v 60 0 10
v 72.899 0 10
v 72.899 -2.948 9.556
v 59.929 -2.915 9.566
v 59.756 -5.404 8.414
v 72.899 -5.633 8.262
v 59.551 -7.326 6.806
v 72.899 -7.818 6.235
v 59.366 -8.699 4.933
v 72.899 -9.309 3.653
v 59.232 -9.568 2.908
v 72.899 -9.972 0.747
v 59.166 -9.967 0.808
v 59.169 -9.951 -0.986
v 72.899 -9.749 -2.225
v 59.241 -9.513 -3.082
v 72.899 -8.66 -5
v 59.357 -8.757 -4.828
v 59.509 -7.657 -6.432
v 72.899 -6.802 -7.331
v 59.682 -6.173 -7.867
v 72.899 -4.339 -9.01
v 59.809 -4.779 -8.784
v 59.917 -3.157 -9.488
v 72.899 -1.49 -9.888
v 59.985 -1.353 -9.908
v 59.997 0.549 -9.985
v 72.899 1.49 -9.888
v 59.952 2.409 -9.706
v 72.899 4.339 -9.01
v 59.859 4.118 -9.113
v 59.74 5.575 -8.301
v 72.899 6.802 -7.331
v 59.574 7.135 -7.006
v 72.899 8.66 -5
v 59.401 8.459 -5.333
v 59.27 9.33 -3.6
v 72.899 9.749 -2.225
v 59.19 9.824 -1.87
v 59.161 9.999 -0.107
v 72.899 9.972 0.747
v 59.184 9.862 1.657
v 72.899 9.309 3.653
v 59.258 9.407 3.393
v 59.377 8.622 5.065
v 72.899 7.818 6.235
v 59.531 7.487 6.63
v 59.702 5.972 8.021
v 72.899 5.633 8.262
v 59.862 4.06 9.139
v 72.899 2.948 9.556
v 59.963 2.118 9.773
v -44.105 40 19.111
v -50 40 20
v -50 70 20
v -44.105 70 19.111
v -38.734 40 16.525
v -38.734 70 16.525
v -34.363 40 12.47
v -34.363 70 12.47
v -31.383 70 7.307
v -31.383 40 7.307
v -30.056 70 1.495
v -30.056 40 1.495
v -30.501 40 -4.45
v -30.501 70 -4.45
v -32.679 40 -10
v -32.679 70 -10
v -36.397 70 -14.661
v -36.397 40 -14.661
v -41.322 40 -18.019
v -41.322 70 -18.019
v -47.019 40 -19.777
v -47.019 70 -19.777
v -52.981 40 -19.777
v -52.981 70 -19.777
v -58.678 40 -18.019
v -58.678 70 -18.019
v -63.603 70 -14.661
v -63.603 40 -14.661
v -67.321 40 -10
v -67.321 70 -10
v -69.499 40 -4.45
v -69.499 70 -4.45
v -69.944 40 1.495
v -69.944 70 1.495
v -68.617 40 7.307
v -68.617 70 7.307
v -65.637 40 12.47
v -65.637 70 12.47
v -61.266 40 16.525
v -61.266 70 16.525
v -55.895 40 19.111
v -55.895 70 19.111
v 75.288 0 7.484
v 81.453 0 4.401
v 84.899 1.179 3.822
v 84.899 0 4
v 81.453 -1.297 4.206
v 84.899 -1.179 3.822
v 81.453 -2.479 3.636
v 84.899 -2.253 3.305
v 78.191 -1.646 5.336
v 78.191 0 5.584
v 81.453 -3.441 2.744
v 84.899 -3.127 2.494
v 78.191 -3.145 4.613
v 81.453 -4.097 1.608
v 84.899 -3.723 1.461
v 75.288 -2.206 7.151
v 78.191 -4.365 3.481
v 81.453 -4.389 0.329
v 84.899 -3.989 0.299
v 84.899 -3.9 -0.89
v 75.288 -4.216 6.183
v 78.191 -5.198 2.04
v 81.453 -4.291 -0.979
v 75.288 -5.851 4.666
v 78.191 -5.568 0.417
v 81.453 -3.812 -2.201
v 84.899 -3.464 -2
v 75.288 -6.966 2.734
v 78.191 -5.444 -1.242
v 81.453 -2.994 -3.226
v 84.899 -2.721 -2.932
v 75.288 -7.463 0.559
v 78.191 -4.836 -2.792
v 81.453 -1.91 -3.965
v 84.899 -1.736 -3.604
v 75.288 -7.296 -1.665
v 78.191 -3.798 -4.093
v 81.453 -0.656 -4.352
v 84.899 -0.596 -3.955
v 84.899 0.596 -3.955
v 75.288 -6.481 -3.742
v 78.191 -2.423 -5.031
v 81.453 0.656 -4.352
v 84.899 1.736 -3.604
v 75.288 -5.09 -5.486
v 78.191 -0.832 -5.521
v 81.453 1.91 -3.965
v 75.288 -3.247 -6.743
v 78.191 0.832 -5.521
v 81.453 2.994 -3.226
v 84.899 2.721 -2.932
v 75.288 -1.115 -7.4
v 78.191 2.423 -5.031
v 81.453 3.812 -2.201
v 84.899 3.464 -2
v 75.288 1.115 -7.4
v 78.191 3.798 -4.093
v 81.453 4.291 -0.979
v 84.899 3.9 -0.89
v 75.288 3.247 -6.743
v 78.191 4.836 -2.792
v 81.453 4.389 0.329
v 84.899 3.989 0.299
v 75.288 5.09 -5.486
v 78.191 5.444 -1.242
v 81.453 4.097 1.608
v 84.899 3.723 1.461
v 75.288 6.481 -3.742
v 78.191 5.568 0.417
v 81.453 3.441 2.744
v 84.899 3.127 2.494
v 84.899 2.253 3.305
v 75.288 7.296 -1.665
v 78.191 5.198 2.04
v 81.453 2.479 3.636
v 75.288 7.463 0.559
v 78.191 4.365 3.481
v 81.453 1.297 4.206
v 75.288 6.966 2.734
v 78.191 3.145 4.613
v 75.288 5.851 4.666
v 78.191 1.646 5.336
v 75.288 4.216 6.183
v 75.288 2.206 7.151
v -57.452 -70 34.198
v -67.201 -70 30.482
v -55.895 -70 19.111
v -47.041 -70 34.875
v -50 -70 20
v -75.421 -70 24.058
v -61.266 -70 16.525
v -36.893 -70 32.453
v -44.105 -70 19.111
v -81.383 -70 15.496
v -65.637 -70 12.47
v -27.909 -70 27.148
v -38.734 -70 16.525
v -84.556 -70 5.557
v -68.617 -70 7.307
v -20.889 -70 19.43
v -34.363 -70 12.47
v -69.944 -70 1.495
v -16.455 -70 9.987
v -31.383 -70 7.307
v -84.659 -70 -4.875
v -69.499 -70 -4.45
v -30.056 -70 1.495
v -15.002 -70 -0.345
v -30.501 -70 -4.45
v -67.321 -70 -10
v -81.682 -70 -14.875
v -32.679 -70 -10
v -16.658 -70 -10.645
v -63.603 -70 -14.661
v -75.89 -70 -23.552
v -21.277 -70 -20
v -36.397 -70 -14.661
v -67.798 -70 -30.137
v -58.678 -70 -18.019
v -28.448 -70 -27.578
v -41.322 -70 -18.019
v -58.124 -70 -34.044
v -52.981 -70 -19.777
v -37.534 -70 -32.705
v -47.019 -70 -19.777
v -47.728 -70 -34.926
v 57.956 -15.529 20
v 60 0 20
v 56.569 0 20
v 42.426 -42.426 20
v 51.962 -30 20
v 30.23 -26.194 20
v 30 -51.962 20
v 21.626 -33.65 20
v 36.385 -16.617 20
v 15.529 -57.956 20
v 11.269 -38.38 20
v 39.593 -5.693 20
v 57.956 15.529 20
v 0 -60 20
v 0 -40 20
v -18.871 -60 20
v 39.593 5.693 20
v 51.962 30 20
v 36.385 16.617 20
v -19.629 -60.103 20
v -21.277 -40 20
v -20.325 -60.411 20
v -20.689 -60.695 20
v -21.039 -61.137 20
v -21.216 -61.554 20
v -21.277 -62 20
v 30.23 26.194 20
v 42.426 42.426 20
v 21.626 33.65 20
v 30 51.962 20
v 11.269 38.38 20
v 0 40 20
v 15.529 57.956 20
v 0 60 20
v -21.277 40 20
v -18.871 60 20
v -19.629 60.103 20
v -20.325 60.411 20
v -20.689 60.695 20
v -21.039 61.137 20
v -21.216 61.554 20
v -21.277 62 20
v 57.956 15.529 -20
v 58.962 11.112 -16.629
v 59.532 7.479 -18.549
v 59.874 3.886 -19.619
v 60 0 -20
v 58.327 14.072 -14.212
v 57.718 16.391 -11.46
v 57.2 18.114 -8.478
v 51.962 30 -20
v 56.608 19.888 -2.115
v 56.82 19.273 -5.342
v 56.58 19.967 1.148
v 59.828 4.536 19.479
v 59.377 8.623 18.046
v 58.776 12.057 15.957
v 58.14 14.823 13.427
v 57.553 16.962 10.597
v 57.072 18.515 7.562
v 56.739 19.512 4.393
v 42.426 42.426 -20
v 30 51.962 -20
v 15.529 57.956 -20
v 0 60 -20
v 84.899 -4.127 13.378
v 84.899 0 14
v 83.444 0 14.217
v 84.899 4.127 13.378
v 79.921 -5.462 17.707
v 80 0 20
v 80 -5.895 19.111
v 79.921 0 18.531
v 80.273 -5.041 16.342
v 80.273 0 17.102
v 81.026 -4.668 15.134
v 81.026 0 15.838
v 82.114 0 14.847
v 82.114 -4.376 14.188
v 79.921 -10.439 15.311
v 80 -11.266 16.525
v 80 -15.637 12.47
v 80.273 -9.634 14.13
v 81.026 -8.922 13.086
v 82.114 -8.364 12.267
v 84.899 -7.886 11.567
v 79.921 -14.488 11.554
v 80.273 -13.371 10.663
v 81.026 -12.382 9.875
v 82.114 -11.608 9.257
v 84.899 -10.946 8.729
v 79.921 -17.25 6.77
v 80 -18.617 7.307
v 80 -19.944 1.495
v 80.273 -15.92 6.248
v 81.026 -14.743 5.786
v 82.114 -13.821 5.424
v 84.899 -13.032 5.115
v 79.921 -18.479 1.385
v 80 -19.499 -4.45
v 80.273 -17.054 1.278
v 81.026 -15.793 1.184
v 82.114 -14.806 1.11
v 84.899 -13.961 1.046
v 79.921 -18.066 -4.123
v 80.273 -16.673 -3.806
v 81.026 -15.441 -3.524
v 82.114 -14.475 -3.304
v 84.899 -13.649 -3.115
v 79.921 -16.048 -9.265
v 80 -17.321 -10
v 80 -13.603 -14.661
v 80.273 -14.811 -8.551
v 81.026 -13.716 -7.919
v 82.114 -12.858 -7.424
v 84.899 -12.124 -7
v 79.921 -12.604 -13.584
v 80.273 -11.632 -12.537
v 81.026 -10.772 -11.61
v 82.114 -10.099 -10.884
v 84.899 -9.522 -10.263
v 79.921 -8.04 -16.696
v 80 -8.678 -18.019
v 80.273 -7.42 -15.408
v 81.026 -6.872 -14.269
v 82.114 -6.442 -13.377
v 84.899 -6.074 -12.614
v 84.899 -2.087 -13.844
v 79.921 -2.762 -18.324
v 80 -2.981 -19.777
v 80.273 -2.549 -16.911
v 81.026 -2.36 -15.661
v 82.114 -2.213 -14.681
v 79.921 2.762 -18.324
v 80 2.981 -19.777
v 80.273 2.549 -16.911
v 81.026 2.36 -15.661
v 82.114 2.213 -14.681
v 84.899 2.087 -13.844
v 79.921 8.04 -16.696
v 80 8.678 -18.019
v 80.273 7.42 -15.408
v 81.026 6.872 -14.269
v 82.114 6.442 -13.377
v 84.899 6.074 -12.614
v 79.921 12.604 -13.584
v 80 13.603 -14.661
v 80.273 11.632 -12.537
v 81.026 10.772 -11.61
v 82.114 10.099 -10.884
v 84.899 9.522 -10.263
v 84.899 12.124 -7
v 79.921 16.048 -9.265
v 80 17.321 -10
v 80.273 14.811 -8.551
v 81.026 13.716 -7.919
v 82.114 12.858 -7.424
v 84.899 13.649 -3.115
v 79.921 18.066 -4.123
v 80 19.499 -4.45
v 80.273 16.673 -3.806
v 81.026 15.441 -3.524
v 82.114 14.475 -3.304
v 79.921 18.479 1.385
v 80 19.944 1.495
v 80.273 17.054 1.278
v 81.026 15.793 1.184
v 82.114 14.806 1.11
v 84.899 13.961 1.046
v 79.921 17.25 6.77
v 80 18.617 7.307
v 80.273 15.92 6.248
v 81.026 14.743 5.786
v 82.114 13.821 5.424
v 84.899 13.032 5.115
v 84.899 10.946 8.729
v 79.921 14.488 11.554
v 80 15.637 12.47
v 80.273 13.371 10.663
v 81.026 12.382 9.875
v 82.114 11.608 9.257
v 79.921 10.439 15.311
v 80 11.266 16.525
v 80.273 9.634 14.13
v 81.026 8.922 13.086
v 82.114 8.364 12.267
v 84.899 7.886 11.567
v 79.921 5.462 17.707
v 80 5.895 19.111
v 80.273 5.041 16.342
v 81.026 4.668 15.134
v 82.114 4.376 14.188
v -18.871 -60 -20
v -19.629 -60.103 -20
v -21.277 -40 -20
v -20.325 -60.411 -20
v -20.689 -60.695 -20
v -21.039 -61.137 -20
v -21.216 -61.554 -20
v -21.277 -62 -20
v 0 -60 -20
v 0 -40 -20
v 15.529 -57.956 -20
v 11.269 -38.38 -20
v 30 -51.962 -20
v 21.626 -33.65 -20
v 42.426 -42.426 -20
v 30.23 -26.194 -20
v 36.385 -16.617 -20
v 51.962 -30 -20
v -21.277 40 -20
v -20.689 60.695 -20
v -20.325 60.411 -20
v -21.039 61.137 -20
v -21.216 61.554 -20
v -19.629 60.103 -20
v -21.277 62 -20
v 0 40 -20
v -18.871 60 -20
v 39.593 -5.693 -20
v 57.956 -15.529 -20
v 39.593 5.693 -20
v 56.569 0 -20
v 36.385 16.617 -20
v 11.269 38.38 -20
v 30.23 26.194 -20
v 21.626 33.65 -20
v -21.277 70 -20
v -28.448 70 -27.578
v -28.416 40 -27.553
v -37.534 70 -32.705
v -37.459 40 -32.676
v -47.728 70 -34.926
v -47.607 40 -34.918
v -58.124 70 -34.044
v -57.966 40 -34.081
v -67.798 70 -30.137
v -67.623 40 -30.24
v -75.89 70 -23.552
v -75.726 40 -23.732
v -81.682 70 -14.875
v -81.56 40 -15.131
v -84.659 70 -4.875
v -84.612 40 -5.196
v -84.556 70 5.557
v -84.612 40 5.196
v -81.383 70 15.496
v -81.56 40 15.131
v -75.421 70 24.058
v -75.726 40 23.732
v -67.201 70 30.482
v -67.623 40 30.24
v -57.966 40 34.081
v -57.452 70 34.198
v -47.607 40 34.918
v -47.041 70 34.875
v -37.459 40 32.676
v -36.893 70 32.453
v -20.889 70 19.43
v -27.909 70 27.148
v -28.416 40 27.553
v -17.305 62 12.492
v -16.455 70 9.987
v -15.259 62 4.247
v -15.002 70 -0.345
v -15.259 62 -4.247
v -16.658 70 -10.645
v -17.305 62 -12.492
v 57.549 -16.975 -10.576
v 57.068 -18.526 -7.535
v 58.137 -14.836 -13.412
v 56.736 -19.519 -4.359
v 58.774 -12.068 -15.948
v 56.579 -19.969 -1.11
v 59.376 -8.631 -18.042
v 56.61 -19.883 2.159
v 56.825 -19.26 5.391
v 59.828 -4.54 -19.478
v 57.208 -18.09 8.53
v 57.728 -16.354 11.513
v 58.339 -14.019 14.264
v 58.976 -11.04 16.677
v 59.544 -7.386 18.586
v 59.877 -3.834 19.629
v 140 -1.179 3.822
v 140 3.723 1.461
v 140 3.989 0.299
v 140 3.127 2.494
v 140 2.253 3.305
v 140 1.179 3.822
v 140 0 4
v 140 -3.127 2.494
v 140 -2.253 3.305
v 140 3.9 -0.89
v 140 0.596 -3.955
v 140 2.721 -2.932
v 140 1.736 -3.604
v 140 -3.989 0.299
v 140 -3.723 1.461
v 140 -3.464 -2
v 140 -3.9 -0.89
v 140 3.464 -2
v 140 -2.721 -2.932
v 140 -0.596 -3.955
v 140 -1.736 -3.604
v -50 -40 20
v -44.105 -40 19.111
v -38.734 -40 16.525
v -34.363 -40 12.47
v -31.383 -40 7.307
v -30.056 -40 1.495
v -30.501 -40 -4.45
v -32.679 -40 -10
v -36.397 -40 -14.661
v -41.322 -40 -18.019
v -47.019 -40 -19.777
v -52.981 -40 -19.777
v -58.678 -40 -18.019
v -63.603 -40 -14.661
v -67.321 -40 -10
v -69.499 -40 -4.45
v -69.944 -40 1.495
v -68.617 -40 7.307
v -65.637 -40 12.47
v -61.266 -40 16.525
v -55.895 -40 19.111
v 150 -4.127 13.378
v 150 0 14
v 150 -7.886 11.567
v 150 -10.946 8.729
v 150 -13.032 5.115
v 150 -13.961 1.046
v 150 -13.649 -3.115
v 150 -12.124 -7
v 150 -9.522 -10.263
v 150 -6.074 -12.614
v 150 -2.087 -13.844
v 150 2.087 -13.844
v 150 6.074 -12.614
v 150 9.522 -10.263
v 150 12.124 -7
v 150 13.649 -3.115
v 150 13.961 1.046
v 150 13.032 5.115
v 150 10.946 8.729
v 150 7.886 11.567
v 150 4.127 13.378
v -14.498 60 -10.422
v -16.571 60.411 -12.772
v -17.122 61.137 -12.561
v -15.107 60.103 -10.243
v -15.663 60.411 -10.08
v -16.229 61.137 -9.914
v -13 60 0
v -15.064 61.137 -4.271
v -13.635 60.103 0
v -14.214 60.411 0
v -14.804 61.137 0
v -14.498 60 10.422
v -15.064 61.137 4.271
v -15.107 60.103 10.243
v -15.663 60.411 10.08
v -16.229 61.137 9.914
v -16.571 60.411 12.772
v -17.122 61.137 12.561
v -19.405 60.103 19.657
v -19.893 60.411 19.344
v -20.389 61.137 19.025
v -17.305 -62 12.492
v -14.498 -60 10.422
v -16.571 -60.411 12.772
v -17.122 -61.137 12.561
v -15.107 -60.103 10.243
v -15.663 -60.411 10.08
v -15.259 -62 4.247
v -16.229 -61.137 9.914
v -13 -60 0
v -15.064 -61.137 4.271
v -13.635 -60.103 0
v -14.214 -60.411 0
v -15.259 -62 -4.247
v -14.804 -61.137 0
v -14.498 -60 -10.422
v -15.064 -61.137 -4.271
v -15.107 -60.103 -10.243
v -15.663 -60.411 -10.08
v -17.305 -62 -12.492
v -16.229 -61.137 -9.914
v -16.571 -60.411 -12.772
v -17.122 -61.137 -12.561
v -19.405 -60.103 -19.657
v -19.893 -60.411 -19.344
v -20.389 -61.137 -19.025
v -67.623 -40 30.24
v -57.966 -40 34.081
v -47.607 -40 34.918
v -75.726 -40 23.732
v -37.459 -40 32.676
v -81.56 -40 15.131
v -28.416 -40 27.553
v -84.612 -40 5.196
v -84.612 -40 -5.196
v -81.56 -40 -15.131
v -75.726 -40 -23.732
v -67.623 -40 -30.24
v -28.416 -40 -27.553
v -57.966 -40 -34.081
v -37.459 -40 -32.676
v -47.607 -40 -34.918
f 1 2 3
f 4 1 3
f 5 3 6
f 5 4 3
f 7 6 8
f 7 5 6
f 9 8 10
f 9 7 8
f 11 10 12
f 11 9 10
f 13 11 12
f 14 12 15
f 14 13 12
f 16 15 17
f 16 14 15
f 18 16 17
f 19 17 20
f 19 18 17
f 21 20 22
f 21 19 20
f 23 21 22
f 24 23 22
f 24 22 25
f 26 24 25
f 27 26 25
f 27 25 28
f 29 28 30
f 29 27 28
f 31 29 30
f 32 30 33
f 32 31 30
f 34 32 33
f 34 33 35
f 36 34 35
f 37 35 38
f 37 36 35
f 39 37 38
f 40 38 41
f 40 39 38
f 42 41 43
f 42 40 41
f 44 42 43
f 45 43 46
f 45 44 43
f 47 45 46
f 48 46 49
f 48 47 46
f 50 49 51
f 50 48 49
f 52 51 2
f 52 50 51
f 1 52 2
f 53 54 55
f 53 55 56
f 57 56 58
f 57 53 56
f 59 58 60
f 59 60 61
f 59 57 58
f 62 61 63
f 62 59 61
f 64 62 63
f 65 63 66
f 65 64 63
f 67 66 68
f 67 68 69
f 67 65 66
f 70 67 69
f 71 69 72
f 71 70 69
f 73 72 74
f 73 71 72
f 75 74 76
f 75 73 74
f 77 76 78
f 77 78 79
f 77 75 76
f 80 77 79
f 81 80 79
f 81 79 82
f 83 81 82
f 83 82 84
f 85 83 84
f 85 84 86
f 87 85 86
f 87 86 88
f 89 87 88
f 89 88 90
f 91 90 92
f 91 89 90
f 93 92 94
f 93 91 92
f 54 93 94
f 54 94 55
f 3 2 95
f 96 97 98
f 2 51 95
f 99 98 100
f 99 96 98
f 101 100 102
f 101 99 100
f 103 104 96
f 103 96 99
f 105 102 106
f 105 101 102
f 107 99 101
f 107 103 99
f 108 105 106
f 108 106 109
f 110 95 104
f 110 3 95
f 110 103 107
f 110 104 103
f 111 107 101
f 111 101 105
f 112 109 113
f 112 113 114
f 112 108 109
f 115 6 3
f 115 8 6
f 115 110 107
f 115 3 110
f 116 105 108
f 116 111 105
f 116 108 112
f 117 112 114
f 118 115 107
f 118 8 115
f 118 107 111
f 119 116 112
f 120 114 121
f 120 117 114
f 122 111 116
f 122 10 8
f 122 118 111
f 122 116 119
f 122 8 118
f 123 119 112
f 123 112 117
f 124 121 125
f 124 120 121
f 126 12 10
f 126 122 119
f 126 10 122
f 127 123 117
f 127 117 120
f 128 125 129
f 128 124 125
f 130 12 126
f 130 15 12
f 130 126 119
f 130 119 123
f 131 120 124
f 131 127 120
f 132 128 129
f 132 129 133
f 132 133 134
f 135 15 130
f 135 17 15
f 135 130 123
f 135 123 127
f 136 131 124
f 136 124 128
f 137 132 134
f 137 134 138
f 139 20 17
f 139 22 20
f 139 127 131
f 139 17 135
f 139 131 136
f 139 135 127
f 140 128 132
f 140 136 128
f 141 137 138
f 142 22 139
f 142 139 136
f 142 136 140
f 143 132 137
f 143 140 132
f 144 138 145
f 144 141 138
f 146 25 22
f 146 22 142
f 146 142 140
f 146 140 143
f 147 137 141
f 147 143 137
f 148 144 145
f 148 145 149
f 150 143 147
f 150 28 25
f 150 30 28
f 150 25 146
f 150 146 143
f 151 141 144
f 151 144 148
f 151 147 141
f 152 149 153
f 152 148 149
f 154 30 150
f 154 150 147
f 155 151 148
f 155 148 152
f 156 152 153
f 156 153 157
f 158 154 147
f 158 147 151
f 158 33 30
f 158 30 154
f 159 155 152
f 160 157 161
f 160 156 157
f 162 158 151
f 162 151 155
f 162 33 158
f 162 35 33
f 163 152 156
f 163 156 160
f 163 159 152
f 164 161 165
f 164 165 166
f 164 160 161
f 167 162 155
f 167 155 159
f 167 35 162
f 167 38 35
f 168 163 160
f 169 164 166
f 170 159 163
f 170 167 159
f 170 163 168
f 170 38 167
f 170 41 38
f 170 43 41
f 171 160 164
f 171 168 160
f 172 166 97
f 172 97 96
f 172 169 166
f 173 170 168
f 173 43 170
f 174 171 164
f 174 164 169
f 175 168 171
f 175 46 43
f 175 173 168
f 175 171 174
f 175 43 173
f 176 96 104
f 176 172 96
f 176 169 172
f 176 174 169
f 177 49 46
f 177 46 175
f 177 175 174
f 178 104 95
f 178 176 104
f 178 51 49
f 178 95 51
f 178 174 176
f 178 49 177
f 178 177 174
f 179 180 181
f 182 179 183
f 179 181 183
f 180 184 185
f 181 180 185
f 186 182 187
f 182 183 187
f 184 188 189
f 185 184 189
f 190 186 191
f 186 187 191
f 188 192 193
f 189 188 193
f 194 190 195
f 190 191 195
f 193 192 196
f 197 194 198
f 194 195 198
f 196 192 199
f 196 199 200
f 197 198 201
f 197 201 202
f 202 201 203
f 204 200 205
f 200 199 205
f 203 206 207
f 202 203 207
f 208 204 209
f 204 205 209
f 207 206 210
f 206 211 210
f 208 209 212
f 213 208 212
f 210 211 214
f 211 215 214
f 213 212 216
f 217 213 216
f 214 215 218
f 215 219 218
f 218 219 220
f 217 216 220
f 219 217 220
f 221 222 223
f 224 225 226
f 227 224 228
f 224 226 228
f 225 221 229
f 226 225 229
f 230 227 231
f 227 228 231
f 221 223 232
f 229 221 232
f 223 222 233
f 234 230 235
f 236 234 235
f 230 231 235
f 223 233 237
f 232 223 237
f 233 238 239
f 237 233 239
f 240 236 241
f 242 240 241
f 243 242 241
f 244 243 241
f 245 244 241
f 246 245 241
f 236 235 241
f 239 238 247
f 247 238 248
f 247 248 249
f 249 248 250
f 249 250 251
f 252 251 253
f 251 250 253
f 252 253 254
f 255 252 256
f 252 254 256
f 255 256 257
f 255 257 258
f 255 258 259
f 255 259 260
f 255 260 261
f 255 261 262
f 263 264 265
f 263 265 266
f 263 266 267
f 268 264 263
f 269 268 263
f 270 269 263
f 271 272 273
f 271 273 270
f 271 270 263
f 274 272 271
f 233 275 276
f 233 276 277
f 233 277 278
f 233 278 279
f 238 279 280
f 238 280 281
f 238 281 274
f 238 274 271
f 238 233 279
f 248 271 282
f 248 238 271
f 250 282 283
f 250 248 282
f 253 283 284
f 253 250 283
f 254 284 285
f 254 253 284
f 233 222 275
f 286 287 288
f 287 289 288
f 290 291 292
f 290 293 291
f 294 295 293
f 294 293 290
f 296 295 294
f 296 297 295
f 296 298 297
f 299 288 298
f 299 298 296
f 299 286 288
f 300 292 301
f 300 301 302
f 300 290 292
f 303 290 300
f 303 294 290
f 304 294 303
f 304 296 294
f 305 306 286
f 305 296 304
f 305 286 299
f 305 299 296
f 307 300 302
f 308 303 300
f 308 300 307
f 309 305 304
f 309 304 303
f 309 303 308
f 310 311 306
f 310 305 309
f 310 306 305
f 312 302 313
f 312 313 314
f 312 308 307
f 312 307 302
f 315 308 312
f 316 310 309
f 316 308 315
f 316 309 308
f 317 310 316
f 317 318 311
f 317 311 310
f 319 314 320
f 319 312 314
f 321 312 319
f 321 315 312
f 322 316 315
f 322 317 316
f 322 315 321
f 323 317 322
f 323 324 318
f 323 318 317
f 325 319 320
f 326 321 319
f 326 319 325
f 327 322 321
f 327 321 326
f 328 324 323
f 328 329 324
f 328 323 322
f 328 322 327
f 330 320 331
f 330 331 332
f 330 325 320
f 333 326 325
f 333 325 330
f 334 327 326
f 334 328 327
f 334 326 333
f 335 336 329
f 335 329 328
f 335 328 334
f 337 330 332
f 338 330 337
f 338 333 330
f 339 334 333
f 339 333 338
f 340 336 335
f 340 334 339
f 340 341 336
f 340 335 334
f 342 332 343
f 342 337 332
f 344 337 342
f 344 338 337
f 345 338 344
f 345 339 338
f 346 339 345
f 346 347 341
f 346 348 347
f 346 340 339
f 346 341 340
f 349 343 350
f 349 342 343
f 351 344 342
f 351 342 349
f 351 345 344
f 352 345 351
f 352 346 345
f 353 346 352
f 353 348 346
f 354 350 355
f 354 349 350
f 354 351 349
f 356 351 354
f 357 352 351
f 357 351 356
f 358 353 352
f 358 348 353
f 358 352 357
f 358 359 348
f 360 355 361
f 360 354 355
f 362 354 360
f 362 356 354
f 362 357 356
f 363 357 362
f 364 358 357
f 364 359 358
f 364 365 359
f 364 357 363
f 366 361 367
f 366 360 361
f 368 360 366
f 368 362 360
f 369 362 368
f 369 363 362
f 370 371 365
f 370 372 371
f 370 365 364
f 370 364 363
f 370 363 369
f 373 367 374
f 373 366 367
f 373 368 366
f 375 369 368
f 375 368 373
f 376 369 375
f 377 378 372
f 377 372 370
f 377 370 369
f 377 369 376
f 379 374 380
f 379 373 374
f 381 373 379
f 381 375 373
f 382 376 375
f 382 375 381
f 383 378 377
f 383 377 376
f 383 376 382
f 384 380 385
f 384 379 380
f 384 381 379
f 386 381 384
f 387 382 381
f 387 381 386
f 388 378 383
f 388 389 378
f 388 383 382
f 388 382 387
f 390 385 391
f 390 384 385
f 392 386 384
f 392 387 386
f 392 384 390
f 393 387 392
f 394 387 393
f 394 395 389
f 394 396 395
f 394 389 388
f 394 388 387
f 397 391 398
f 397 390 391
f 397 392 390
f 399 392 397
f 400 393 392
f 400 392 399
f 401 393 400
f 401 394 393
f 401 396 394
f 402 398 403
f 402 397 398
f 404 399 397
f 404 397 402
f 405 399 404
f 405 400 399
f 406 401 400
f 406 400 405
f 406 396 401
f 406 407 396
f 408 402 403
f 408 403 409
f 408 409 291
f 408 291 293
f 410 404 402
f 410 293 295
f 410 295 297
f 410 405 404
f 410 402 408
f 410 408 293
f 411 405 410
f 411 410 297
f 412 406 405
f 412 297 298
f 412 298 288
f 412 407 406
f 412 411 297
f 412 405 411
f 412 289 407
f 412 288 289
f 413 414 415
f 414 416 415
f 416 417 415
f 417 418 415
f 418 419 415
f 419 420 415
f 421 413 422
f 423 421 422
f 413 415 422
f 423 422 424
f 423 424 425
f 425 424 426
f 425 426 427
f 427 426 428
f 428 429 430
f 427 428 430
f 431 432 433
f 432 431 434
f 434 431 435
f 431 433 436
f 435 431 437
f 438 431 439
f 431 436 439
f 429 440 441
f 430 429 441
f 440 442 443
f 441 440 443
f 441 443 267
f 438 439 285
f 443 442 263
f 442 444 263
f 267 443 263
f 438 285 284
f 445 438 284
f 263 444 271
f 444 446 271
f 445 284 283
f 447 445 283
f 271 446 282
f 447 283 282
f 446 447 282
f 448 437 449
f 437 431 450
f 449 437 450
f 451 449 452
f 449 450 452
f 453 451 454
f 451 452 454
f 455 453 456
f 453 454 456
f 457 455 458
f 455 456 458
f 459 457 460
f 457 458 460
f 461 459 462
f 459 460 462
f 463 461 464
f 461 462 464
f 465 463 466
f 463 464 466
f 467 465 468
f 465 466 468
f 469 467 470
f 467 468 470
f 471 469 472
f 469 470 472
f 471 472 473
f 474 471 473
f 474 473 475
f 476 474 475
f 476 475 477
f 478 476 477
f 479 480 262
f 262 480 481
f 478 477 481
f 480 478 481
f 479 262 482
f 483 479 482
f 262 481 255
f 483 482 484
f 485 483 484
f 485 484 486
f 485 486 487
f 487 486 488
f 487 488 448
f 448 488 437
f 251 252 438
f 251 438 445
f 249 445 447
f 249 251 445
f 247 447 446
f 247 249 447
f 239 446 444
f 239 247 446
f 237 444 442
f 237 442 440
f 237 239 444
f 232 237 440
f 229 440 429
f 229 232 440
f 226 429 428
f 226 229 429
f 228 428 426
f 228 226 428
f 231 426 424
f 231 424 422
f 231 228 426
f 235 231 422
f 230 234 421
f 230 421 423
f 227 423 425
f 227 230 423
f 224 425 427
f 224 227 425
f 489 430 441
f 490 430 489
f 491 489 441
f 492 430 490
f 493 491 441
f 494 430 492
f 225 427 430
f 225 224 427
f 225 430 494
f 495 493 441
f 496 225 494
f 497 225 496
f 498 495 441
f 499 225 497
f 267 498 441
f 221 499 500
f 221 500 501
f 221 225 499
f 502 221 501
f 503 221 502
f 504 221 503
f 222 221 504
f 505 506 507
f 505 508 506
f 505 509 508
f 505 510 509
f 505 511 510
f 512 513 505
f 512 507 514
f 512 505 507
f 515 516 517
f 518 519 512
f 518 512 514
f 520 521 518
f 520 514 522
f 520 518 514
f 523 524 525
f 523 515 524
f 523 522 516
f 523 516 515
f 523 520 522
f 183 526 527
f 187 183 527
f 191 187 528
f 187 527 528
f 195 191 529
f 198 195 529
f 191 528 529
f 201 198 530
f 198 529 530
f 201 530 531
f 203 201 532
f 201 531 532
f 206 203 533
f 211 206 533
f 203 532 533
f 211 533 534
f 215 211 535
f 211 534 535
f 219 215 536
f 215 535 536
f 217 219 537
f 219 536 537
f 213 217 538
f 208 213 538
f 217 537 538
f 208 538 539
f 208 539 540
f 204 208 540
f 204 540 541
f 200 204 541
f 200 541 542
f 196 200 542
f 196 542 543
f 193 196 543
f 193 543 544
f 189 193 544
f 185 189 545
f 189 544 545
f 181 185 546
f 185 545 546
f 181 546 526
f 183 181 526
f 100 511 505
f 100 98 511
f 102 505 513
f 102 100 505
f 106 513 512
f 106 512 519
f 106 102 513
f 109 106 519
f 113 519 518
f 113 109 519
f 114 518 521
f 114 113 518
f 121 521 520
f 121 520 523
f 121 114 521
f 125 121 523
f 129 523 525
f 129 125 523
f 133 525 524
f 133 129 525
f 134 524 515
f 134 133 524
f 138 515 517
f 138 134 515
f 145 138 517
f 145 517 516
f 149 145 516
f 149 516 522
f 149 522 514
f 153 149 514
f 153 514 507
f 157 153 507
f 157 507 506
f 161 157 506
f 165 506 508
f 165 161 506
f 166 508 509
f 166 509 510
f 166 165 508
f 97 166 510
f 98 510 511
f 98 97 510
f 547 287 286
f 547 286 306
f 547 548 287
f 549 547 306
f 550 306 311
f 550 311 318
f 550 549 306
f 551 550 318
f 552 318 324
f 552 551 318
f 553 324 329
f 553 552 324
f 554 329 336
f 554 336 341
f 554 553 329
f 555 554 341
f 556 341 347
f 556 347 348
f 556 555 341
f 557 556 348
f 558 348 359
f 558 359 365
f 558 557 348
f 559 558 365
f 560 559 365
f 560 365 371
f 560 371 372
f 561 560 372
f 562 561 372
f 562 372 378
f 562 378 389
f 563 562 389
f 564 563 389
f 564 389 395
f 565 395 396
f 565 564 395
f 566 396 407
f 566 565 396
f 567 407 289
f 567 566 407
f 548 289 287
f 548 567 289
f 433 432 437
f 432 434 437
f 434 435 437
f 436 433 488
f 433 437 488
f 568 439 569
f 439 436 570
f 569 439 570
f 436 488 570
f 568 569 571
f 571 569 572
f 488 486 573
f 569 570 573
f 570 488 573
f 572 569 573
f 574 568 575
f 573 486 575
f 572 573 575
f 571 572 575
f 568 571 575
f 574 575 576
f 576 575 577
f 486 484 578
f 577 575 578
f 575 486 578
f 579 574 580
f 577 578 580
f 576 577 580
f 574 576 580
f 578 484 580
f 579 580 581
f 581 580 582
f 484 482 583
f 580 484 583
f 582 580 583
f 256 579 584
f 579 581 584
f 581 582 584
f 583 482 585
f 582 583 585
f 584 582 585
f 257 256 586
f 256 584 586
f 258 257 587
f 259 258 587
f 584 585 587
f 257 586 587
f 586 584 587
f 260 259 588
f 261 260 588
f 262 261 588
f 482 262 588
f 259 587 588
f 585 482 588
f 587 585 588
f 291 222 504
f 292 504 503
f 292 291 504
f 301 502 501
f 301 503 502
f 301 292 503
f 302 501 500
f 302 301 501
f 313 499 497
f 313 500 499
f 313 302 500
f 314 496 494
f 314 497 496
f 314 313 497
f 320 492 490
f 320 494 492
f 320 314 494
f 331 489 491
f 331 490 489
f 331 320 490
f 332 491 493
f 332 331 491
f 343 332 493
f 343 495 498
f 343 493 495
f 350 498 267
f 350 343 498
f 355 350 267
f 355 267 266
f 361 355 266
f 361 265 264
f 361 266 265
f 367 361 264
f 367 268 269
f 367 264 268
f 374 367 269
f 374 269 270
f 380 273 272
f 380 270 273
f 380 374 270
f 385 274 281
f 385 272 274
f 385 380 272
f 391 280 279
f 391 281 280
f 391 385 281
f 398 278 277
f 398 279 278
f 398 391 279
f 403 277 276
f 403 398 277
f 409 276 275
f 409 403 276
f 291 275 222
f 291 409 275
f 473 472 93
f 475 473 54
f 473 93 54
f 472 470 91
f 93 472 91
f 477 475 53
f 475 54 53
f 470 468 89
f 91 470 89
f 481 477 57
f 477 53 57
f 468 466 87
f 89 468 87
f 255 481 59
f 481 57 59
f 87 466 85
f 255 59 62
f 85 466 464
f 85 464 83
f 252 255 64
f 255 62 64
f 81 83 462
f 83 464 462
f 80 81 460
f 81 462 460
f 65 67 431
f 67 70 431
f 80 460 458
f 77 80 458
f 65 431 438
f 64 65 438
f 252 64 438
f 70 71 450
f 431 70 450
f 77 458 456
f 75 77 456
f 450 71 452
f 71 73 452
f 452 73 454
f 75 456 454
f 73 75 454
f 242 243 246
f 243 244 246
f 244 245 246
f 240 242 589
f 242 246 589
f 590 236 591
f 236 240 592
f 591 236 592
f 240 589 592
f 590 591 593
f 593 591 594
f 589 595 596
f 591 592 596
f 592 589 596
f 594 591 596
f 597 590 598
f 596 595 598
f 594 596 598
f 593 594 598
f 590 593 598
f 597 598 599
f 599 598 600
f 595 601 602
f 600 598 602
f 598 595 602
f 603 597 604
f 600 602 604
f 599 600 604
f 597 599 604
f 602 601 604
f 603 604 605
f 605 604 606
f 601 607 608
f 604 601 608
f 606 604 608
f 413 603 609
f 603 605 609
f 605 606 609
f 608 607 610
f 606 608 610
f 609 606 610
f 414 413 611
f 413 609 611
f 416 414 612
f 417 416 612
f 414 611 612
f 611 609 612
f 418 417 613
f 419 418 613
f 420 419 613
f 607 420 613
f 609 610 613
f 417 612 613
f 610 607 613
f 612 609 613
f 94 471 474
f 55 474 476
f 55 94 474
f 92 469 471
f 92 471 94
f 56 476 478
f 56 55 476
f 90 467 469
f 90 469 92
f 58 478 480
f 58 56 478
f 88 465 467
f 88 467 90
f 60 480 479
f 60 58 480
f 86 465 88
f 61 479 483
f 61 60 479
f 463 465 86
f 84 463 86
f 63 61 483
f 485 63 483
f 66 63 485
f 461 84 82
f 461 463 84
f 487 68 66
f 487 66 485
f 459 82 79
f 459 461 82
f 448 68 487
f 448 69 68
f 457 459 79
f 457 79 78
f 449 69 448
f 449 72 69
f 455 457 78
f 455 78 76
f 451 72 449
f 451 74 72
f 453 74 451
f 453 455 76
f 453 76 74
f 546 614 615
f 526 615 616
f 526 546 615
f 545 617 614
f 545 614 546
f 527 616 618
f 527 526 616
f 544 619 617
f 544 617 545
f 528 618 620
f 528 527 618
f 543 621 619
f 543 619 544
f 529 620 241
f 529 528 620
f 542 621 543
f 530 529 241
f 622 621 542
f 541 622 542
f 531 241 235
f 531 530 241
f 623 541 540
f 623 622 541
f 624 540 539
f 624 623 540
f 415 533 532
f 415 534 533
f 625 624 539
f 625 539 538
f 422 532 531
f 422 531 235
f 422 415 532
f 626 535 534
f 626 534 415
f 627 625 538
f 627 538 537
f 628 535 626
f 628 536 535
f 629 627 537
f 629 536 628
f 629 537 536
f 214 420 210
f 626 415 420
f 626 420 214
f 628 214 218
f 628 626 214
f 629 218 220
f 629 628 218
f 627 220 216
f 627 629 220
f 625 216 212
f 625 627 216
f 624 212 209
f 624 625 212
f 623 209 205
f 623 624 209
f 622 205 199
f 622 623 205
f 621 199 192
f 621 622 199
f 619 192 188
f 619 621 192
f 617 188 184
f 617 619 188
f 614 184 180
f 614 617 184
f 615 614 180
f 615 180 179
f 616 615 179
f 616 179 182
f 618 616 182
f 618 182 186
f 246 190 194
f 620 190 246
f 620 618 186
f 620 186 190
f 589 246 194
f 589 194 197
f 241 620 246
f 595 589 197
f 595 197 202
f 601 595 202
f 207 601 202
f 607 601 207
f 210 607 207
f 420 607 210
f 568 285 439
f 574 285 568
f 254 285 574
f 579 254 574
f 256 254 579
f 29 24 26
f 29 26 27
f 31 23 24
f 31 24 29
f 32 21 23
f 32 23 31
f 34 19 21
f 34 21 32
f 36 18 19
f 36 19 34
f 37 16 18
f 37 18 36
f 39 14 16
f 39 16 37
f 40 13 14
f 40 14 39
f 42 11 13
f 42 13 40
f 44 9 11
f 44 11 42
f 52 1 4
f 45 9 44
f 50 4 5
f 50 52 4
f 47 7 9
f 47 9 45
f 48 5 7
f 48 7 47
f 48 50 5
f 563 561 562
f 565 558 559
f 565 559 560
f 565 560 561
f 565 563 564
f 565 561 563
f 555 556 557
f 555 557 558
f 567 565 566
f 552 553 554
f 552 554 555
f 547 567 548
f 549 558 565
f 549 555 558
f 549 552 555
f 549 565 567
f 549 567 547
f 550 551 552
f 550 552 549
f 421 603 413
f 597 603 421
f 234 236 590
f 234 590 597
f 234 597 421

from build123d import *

# Parameters (mm, degrees)
BOSS_EXTRUDE1_DEPTH = 20
SKETCH2_R           = 35
SKETCH2_R_2         = 20
BOSS_EXTRUDE2_DEPTH = 30
FILLET1_R           = 2
FILLET2_R           = 2


with BuildPart() as part:
    # Sketch1 → Revolve-Thin1 (revolve)
    with BuildSketch(Plane.XY, mode=Mode.PRIVATE) as revolve_thin1_sk:
        with BuildLine():
            Line((56.568542495, 20), (80, 20))
            ThreePointArc((80, 20), (81.025996139, 15.83772234), (84.898979486, 14))
            Line((84.898979486, 14), (150, 14))
            Line((150, 14), (150, 0))
            Line((150, 0), (140, 0))
            Line((140, 0), (140, 4))
            Line((140, 4), (84.898979486, 4))
            ThreePointArc((84.898979486, 4), (78.190775553, 5.583592135), (72.898979486, 10))
            Line((72.898979486, 10), (56.568542495, 10))
            Line((56.568542495, 10), (56.568542495, 20))
        make_face()
    revolve(revolve_thin1_sk.sketch.rotate(Axis((-93.302775415, 0, 0), (1, 0, 0)), 90), axis=Axis((-93.302775415, 0, 0), (1, 0, 0)))

    # Sketch1<4> → Boss-Extrude1 (add, symmetric)
    with BuildSketch(Plane.XY):
        with BuildLine():
            Line((0, 60), (-21.3, 60))
            Line((-21.3, 60), (-21.3, 40))
            Line((-21.3, 40), (0, 40))
            ThreePointArc((0, 40), (40, 0), (0, -40))
            Line((0, -40), (-21.3, -40))
            Line((-21.3, -40), (-21.3, -60))
            Line((-21.3, -60), (0, -60))
            ThreePointArc((0, -60), (60, 0), (0, 60))
        make_face()
    extrude(amount=BOSS_EXTRUDE1_DEPTH, both=True)

    # Sketch2 → Boss-Extrude2 (add)
    with BuildSketch(Plane(origin=(0, 40, 0), x_dir=(1, 0, 0), z_dir=(0, 1, 0))):
        with Locations(Location((-50, 0, 0), (0, 0, 34.849904579))):
            Circle(SKETCH2_R)
        with Locations(Location((-50, 0, 0), (0, 0, 270))):
            Circle(SKETCH2_R_2, mode=Mode.SUBTRACT)
    boss_extrude2 = extrude(amount=BOSS_EXTRUDE2_DEPTH)

    # Fillet1
    # the kernel refuses this fillet: 2 mm, written as the material it adds along each edge
    with BuildSketch(Plane(origin=(-50, 60, 0), x_dir=(0.7309132797972386, 0, -0.682470349111259), z_dir=(-0.682470349111259, 0, -0.7309132797972386))) as fillet1_piece_1_section:
        with BuildLine():
            CenterArc((35 + FILLET1_R, -FILLET1_R), FILLET1_R, 90, 90)
            Line((35, -FILLET1_R), (35, 0))
            Line((35, 0), (35 + FILLET1_R, 0))
        make_face()
    fillet1_piece_1 = revolve(axis=Axis((-50, 60, 0), (0, -1, 0)), revolution_arc=86.073975491, mode=Mode.PRIVATE)
    fillet1_piece_1 = split(fillet1_piece_1, bisect_by=Plane(origin=(-14.43905365, 60.56094635, -20), z_dir=(0, 0, 1)), keep=Keep.TOP, mode=Mode.PRIVATE)
    fillet1_piece_1 = split(fillet1_piece_1, bisect_by=Plane(origin=(-14.43905365, 60.56094635, 20), z_dir=(0, 0, -1)), keep=Keep.TOP, mode=Mode.PRIVATE)
    add(fillet1_piece_1)

    # Mirror3: Boss-Extrude2 across plane
    add(boss_extrude2.mirror(Plane.ZX))

    # Fillet2
    # the kernel refuses this fillet: 2 mm, written as the material it adds along each edge
    with BuildSketch(Plane(origin=(-50, -60, 0), x_dir=(0.7309132797966846, 0, 0.6824703491118522), z_dir=(-0.6824703491118522, 0, 0.7309132797966846))) as fillet2_piece_1_section:
        with BuildLine():
            CenterArc((35 + FILLET2_R, -FILLET2_R), FILLET2_R, 90, 90)
            Line((35, -FILLET2_R), (35, 0))
            Line((35, 0), (35 + FILLET2_R, 0))
        make_face()
    fillet2_piece_1 = revolve(axis=Axis((-50, -60, 0), (0, 1, 0)), revolution_arc=86.073975491, mode=Mode.PRIVATE)
    fillet2_piece_1 = split(fillet2_piece_1, bisect_by=Plane(origin=(-14.439053646, -60.560946354, -20), z_dir=(0, 0, 1)), keep=Keep.TOP, mode=Mode.PRIVATE)
    fillet2_piece_1 = split(fillet2_piece_1, bisect_by=Plane(origin=(-14.439053646, -60.560946354, 20), z_dir=(0, 0, -1)), keep=Keep.TOP, mode=Mode.PRIVATE)
    add(fillet2_piece_1)


solid = part.part
